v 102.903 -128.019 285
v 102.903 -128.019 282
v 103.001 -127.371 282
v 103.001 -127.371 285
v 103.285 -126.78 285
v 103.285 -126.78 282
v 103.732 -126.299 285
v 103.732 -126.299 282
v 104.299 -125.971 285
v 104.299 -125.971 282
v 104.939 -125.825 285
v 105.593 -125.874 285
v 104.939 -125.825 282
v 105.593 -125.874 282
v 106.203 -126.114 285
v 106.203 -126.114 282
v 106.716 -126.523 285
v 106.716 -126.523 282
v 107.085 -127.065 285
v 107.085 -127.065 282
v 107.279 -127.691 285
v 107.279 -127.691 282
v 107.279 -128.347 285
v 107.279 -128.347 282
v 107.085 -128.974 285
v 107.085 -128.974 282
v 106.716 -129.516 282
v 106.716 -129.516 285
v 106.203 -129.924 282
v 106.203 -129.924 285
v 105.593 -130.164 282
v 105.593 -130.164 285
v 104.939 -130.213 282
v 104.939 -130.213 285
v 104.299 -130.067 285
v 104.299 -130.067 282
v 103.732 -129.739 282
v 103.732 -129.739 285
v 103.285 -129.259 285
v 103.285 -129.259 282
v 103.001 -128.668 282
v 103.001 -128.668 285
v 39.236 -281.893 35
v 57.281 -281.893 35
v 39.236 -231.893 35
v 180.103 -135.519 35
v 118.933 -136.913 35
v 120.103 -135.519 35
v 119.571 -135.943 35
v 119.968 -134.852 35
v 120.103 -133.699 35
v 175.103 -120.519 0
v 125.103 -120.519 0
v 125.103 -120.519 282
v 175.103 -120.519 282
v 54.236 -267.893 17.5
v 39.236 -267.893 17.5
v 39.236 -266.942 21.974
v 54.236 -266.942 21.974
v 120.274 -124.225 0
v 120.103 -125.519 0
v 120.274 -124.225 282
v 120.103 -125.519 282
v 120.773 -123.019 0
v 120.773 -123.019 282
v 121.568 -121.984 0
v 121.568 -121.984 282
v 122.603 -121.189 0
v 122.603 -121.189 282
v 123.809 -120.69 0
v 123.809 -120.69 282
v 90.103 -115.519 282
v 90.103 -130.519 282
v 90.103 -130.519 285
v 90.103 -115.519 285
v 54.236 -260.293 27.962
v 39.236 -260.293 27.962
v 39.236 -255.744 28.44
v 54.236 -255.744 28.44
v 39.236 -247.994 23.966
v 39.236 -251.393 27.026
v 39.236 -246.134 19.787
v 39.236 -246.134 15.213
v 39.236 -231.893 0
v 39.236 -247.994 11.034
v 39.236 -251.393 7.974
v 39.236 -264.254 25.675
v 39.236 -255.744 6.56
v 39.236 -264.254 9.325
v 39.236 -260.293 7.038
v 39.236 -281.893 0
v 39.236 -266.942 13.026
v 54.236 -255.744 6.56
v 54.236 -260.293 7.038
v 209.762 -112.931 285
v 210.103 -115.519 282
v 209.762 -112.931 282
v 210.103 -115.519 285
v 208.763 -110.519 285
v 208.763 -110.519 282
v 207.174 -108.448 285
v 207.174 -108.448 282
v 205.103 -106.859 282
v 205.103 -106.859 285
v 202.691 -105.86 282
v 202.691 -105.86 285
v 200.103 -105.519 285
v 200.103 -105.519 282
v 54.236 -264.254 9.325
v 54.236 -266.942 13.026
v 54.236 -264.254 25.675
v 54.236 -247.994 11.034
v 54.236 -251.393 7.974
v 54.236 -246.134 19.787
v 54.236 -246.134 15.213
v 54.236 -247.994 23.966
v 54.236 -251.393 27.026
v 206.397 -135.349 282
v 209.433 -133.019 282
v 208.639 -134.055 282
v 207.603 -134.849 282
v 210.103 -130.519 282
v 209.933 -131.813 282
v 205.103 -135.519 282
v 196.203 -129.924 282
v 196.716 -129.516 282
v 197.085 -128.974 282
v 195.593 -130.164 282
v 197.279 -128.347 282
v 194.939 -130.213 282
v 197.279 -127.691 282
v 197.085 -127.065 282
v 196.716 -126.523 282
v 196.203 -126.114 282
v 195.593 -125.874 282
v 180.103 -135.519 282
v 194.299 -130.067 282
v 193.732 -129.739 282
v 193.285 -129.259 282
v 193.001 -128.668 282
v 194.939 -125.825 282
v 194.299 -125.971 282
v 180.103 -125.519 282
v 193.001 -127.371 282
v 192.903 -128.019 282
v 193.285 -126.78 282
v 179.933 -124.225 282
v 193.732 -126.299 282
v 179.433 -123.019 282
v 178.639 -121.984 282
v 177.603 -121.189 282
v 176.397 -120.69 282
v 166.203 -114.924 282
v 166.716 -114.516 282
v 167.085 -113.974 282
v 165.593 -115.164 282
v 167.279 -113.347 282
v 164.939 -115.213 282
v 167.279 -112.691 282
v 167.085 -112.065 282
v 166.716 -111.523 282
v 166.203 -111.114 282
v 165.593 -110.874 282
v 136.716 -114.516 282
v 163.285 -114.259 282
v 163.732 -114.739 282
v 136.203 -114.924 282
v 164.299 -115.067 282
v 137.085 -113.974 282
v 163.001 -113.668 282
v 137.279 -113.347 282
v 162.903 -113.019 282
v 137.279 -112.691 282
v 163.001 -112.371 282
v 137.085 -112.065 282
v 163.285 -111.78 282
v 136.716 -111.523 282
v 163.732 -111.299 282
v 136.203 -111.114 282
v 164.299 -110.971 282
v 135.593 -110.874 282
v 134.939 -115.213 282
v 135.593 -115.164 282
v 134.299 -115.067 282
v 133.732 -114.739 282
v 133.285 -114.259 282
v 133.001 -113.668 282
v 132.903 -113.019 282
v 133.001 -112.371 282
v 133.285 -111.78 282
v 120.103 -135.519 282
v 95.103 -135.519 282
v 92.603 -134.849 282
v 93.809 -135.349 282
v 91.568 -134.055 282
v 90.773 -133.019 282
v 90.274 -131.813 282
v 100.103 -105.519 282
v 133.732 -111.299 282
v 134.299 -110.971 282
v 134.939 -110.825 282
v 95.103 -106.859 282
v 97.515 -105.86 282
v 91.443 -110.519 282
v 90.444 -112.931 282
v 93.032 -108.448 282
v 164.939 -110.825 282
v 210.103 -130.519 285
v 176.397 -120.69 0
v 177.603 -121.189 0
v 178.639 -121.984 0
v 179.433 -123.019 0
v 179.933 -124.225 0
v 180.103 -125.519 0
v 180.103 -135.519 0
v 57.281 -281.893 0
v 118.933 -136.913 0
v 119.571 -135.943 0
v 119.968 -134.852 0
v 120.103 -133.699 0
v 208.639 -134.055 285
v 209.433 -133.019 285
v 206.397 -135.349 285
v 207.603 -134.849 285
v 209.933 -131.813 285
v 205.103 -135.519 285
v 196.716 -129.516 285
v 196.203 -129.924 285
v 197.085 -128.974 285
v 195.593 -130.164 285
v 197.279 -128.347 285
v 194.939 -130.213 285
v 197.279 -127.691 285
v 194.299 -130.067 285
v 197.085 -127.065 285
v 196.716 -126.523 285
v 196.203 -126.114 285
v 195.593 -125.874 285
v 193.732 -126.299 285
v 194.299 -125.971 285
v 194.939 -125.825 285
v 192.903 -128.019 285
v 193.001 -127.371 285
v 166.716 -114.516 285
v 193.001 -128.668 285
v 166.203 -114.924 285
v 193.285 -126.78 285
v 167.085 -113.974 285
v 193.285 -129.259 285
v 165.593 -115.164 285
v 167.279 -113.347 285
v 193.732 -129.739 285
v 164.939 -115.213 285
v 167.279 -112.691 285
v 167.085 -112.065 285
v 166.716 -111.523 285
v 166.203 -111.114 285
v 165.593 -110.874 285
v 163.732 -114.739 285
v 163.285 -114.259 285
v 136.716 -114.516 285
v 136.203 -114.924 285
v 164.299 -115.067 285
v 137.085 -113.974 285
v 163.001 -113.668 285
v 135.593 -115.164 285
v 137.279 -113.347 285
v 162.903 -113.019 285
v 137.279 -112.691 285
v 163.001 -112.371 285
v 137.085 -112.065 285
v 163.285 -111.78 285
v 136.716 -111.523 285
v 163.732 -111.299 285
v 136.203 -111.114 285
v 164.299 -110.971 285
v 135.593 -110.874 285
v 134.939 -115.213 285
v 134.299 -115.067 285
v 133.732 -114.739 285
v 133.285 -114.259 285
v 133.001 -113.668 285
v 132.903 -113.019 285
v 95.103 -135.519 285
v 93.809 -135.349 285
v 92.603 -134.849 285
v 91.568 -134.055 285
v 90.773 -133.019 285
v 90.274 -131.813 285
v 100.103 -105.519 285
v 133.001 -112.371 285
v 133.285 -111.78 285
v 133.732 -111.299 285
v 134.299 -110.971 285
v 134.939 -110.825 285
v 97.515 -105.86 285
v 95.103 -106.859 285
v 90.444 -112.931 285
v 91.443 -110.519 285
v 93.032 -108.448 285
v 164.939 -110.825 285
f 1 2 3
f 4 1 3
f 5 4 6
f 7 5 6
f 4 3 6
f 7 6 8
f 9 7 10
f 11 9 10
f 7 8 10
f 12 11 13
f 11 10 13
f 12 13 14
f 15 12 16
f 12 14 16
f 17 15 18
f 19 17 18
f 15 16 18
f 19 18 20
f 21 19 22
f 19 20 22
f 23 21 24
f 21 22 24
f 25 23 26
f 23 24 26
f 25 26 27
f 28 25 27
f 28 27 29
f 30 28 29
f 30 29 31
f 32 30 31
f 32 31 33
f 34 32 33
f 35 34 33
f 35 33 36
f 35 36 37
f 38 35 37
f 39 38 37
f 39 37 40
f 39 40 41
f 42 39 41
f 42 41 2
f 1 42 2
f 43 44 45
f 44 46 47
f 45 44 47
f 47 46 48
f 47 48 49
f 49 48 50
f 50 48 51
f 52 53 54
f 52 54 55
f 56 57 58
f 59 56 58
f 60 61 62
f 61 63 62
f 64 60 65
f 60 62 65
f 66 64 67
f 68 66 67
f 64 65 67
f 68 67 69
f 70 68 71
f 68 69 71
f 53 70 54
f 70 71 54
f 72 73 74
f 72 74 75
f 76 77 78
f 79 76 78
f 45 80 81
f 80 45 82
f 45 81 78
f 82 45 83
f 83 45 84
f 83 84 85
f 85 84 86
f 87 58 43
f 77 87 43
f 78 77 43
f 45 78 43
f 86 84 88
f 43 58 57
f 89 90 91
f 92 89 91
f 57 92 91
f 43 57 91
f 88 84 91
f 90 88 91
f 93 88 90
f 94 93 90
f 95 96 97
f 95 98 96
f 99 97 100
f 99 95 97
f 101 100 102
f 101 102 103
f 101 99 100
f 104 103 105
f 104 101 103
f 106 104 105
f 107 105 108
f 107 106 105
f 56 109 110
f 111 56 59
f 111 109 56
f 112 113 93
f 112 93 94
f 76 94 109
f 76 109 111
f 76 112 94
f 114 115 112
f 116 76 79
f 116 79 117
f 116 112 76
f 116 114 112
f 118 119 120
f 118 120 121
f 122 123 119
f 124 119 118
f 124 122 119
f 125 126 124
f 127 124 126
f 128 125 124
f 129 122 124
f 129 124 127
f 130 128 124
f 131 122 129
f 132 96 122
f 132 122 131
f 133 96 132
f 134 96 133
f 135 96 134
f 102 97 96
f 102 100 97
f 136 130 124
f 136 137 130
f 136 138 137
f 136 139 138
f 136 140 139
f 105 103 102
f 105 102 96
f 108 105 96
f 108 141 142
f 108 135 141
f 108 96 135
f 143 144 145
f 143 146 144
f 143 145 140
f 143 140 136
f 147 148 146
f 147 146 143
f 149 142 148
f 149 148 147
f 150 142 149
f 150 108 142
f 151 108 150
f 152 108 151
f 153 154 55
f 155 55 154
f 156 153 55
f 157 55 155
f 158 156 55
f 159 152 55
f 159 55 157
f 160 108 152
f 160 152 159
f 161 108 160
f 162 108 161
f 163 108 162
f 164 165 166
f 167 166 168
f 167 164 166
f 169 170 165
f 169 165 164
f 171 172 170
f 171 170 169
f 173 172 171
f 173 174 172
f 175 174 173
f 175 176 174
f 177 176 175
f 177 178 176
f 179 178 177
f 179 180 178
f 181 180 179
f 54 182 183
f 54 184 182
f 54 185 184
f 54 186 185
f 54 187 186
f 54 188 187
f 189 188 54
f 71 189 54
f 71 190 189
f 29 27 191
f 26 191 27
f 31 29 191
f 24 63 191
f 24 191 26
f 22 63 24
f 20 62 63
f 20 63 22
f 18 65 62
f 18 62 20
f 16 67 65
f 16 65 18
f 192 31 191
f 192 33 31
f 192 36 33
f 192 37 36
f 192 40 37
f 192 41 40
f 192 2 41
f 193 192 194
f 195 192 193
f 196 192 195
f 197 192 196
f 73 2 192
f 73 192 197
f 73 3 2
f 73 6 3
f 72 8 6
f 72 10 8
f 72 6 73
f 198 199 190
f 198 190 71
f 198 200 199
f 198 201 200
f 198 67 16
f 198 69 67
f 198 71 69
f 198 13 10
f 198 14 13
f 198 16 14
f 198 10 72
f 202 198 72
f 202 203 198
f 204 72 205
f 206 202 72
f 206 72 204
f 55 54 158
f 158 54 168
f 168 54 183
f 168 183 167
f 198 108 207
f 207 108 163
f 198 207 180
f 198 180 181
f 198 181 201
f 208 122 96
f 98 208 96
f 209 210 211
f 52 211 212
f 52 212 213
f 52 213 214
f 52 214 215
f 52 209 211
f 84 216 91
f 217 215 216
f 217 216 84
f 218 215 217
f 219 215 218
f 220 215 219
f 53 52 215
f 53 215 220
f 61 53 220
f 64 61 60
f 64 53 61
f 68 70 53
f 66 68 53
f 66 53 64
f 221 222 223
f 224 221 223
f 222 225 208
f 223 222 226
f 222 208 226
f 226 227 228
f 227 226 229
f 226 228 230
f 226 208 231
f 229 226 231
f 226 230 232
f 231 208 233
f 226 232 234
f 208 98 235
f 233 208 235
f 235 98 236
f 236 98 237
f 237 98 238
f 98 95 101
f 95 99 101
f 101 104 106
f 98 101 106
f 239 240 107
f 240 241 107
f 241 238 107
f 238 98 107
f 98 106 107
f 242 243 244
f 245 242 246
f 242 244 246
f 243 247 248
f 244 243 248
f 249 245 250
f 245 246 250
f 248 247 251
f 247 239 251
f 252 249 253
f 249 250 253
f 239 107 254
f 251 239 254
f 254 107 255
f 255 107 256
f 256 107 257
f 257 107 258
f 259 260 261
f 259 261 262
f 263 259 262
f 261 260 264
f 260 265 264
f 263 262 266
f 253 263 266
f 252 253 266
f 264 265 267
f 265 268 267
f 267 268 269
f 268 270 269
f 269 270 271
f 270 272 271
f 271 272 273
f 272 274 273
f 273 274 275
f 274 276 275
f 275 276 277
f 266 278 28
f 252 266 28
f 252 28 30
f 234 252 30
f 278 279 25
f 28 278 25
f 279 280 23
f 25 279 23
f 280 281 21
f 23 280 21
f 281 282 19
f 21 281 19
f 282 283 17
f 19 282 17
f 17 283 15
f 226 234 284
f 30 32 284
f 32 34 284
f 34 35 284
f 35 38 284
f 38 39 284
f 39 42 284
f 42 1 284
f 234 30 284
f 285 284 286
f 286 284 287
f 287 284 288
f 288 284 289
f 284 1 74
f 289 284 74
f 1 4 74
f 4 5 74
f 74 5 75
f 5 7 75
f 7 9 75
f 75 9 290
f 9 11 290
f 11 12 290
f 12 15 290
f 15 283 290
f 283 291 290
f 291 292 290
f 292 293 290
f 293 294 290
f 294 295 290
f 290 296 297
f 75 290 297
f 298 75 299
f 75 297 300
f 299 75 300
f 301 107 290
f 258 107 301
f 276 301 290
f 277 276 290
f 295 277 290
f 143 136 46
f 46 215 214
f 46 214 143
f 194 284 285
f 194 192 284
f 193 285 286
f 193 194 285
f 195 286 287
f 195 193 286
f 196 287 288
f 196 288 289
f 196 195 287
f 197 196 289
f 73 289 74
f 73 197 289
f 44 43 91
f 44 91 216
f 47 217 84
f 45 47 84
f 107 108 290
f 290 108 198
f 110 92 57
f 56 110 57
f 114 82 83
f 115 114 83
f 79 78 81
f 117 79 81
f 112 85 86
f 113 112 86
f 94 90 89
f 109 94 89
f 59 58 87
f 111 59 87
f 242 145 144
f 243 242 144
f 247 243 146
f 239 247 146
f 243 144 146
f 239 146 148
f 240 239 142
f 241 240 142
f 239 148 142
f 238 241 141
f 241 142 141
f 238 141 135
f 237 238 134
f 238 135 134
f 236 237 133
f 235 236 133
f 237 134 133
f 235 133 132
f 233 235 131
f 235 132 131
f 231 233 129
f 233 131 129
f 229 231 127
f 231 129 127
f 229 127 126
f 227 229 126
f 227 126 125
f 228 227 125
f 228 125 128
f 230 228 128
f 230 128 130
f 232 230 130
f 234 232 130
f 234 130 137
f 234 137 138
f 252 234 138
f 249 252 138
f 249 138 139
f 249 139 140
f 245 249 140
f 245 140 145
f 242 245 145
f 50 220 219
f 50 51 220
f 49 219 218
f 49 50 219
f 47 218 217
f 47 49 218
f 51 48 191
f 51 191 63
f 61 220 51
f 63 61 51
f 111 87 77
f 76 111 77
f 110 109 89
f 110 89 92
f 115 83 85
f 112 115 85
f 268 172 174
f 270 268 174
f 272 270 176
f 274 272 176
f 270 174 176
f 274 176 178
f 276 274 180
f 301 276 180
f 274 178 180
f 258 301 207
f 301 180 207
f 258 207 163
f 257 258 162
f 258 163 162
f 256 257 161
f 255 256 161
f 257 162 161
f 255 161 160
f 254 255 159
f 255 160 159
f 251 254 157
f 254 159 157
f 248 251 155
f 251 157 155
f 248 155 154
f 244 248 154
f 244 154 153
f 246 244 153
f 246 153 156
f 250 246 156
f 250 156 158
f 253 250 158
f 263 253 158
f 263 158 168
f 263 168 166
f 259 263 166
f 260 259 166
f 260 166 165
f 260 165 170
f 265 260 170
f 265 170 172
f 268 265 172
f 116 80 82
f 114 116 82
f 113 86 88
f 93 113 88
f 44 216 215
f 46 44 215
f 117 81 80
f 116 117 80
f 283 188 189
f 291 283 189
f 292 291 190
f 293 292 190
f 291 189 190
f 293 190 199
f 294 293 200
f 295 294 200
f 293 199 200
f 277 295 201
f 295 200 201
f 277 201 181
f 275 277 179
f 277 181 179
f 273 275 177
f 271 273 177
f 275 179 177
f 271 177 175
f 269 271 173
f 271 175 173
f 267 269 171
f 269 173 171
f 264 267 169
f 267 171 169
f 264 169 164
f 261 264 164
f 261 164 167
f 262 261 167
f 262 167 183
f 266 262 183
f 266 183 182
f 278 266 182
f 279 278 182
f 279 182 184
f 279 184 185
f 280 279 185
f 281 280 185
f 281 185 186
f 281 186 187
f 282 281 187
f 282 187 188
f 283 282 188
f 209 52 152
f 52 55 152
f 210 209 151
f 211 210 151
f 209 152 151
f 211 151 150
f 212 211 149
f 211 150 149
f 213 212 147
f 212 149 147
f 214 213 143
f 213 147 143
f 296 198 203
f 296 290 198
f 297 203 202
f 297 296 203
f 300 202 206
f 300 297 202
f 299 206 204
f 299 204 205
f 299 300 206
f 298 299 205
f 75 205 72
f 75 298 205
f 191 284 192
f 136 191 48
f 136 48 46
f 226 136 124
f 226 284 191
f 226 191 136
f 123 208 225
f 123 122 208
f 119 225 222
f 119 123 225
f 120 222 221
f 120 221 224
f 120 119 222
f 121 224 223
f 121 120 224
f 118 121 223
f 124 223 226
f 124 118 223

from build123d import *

# Parameters (mm, degrees)
BOSS_EXTRUDE1_DEPTH = 35
SKETCH5_W           = 40
SKETCH5_H           = 35
SKETCH5_W_2         = 20
BOSS_EXTRUDE4_DEPTH = 5
BOSS_EXTRUDE5_DEPTH = 35
CUT_EXTRUDE2_DEPTH  = 15
CUT_EXTRUDE3_DEPTH  = 10
SKETCH9_W           = 60
SKETCH9_H           = 15
BOSS_EXTRUDE6_DEPTH = 285
SKETCH10_W          = 35
SKETCH10_H          = 5
CUT_EXTRUDE4_DEPTH  = 250
SKETCH11_W          = 35
SKETCH11_H          = 5
CUT_EXTRUDE5_DEPTH  = 250
SKETCH12_W          = 30
SKETCH12_H          = 15
BOSS_EXTRUDE7_DEPTH = 3
FILLET1_R           = 5
FILLET2_R           = 5
SKETCH13_R          = 2.2
CUT_EXTRUDE6_DEPTH  = 10
SKETCH15_W          = 120
SKETCH15_H          = 15
BOSS_EXTRUDE8_DEPTH = 3
SKETCH16_R          = 2.2
CUT_EXTRUDE7_DEPTH  = 5
FILLET3_R           = 10
FILLET4_R           = 5


with BuildPart() as part:
    # Sketch1 → Boss-Extrude1 (new body)
    with BuildSketch(Plane.XY):
        Polygon((39.235591649, -231.893482393), (39.235591649, -281.893482393), (57.280610091, -281.893482393), (184.29867845, -130.519243102), (124.29867845, -130.519243102), align=None)
    extrude(amount=BOSS_EXTRUDE1_DEPTH)

    # Sketch5 → Boss-Extrude4 (add)
    with BuildSketch(Plane(origin=(0, -130.519243102, 0), x_dir=(1, 0, 0), z_dir=(0, 1, 0))):
        with Locations((104.29867845, -17.5)):
            Rectangle(SKETCH5_W, SKETCH5_H)
        with Locations((194.29867845, -17.5)):
            Rectangle(SKETCH5_W_2, SKETCH5_H)
    extrude(amount=-BOSS_EXTRUDE4_DEPTH)

    # Sketch6 → Boss-Extrude5 (add)
    with BuildSketch(Plane.XY.offset(35)):
        Polygon((184.29867845, -130.519243102), (184.29867845, -135.519243102), (180.103180294, -135.519243102), align=None)
    extrude(amount=-BOSS_EXTRUDE5_DEPTH)

    # Sketch7 → Cut-Extrude2 (cut)
    with BuildSketch(Plane.ZY.offset(-39.235591649)):
        Polygon((21.974103074, -266.942482427), (25.67459308, -264.253919063), (27.961621679, -260.292669331), (28.439740849, -255.743669297), (27.026279442, -251.393482393), (23.965637775, -247.994295455), (19.787028599, -246.133858785), (15.212971401, -246.133858785), (11.034362225, -247.994295455), (7.973720558, -251.393482393), (6.560259151, -255.743669297), (7.038378321, -260.292669331), (9.32540692, -264.253919063), (13.025896926, -266.942482427), (17.5, -267.893482393), align=None)
    extrude(amount=-CUT_EXTRUDE2_DEPTH, mode=Mode.SUBTRACT)

    # Sketch8 → Cut-Extrude3 (cut)
    with BuildSketch(Plane.XZ.offset(135.519243102)):
        with BuildLine():
            ThreePointArc((103.73838358, 19.002908699), (102.200929372, 19.65), (100.663475163, 19.002908699))
            Line((100.663475163, 19.002908699), (102.200929372, 17.5))
            Line((102.200929372, 17.5), (103.73838358, 19.002908699))
        make_face()
        with BuildLine():
            Line((102.200929372, 17.5), (100.663475163, 19.002908699))
            ThreePointArc((100.663475163, 19.002908699), (100.050929372, 17.5), (100.663475163, 15.997091301))
            Line((100.663475163, 15.997091301), (102.200929372, 17.5))
        make_face()
        with BuildLine():
            ThreePointArc((104.350929372, 17.5), (104.191912363, 18.31147195), (103.73838358, 19.002908699))
            Line((103.73838358, 19.002908699), (102.200929372, 17.5))
            Line((102.200929372, 17.5), (103.73838358, 15.997091301))
            ThreePointArc((103.73838358, 15.997091301), (104.191912363, 16.68852805), (104.350929372, 17.5))
        make_face()
        with BuildLine():
            Line((102.200929372, 17.5), (100.663475163, 15.997091301))
            ThreePointArc((100.663475163, 15.997091301), (102.200929372, 15.35), (103.73838358, 15.997091301))
            Line((103.73838358, 15.997091301), (102.200929372, 17.5))
        make_face()
        with BuildLine():
            ThreePointArc((193.423525745, 19.268546892), (192.200929372, 19.65), (190.978332999, 19.268546892))
            Line((190.978332999, 19.268546892), (192.200929372, 17.5))
            Line((192.200929372, 17.5), (193.423525745, 19.268546892))
        make_face()
        with BuildLine():
            Line((192.200929372, 17.5), (190.978332999, 19.268546892))
            ThreePointArc((190.978332999, 19.268546892), (190.050929372, 17.5), (190.978332999, 15.731453108))
            Line((190.978332999, 15.731453108), (192.200929372, 17.5))
        make_face()
        with BuildLine():
            Line((193.423525745, 19.268546892), (192.200929372, 17.5))
            Line((192.200929372, 17.5), (193.423525745, 15.731453108))
            ThreePointArc((193.423525745, 15.731453108), (194.105014743, 16.501521708), (194.350929372, 17.5))
            ThreePointArc((194.350929372, 17.5), (194.105014743, 18.498478292), (193.423525745, 19.268546892))
        make_face()
        with BuildLine():
            Line((193.423525745, 15.731453108), (192.200929372, 17.5))
            Line((192.200929372, 17.5), (190.978332999, 15.731453108))
            ThreePointArc((190.978332999, 15.731453108), (192.200929372, 15.35), (193.423525745, 15.731453108))
        make_face()
    extrude(amount=-CUT_EXTRUDE3_DEPTH, mode=Mode.SUBTRACT)

    # Sketch9 → Boss-Extrude6 (add)
    with BuildSketch(Plane(origin=(0, 0, 0), x_dir=(-1, 0, 0), z_dir=(0, 0, -1))):
        with Locations((-150.103180294, -128.019243102)):
            Rectangle(SKETCH9_W, SKETCH9_H)
    extrude(amount=-BOSS_EXTRUDE6_DEPTH)

    # Sketch10 → Cut-Extrude4 (cut)
    with BuildSketch(Plane(origin=(180.103180294, 0, 0), x_dir=(0, 0, -1), z_dir=(1, 0, 0))):
        with Locations((-17.5, -133.019243102)):
            Rectangle(SKETCH10_W, SKETCH10_H)
    extrude(amount=CUT_EXTRUDE4_DEPTH, mode=Mode.SUBTRACT)

    # Sketch11 → Cut-Extrude5 (cut)
    with BuildSketch(Plane.ZY.offset(-120.103180294)):
        with Locations((17.5, -133.019243102)):
            Rectangle(SKETCH11_W, SKETCH11_H)
    extrude(amount=CUT_EXTRUDE5_DEPTH, mode=Mode.SUBTRACT)

    # Sketch12 → Boss-Extrude7 (add)
    with BuildSketch(Plane.XY.offset(285)):
        with Locations((105.103180294, -128.019243102)):
            Rectangle(SKETCH12_W, SKETCH12_H)
        with Locations((195.103180294, -128.019243102)):
            Rectangle(SKETCH12_W, SKETCH12_H)
    extrude(amount=-BOSS_EXTRUDE7_DEPTH)

    # Fillet1
    fillet1_edges = [part.edges().sort_by_distance(p)[0] for p in [
        (120.103180294, -135.519243102, 17.5),
    ]]
    fillet(fillet1_edges, radius=FILLET1_R)

    # Fillet2
    fillet2_edges = [part.edges().sort_by_distance(p)[0] for p in [
        (120.103180294, -120.519243102, 141),
        (180.103180294, -120.519243102, 141),
    ]]
    fillet(fillet2_edges, radius=FILLET2_R)

    # Sketch13 → Cut-Extrude6 (cut)
    with BuildSketch(Plane(origin=(0, 0, 282), x_dir=(-1, 0, 0), z_dir=(0, 0, -1))):
        with Locations((-105.103180294, -128.019243102)):
            Circle(SKETCH13_R)
        with Locations((-195.103180294, -128.019243102)):
            Circle(SKETCH13_R)
    extrude(amount=-CUT_EXTRUDE6_DEPTH, mode=Mode.SUBTRACT)

    # Sketch15 → Boss-Extrude8 (add)
    with BuildSketch(Plane(origin=(0, 0, 282), x_dir=(-1, 0, 0), z_dir=(0, 0, -1))):
        with Locations((-150.103180294, -113.019243102)):
            Rectangle(SKETCH15_W, SKETCH15_H)
    extrude(amount=-BOSS_EXTRUDE8_DEPTH)

    # Sketch16 → Cut-Extrude7 (cut)
    with BuildSketch(Plane(origin=(0, 0, 282), x_dir=(-1, 0, 0), z_dir=(0, 0, -1))):
        with Locations((-165.103180294, -113.019243102)):
            Circle(SKETCH16_R)
        with Locations((-135.103180294, -113.019243102)):
            Circle(SKETCH16_R)
    extrude(amount=-CUT_EXTRUDE7_DEPTH, mode=Mode.SUBTRACT)

    # Fillet3
    fillet3_edges = [part.edges().sort_by_distance(p)[0] for p in [
        (210.103180294, -105.519243102, 283.5),
        (90.103180294, -105.519243102, 283.5),
    ]]
    fillet(fillet3_edges, radius=FILLET3_R)

    # Fillet4
    fillet4_edges = [part.edges().sort_by_distance(p)[0] for p in [
        (90.103180294, -135.519243102, 283.5),
        (210.103180294, -135.519243102, 283.5),
    ]]
    fillet(fillet4_edges, radius=FILLET4_R)


solid = part.part
